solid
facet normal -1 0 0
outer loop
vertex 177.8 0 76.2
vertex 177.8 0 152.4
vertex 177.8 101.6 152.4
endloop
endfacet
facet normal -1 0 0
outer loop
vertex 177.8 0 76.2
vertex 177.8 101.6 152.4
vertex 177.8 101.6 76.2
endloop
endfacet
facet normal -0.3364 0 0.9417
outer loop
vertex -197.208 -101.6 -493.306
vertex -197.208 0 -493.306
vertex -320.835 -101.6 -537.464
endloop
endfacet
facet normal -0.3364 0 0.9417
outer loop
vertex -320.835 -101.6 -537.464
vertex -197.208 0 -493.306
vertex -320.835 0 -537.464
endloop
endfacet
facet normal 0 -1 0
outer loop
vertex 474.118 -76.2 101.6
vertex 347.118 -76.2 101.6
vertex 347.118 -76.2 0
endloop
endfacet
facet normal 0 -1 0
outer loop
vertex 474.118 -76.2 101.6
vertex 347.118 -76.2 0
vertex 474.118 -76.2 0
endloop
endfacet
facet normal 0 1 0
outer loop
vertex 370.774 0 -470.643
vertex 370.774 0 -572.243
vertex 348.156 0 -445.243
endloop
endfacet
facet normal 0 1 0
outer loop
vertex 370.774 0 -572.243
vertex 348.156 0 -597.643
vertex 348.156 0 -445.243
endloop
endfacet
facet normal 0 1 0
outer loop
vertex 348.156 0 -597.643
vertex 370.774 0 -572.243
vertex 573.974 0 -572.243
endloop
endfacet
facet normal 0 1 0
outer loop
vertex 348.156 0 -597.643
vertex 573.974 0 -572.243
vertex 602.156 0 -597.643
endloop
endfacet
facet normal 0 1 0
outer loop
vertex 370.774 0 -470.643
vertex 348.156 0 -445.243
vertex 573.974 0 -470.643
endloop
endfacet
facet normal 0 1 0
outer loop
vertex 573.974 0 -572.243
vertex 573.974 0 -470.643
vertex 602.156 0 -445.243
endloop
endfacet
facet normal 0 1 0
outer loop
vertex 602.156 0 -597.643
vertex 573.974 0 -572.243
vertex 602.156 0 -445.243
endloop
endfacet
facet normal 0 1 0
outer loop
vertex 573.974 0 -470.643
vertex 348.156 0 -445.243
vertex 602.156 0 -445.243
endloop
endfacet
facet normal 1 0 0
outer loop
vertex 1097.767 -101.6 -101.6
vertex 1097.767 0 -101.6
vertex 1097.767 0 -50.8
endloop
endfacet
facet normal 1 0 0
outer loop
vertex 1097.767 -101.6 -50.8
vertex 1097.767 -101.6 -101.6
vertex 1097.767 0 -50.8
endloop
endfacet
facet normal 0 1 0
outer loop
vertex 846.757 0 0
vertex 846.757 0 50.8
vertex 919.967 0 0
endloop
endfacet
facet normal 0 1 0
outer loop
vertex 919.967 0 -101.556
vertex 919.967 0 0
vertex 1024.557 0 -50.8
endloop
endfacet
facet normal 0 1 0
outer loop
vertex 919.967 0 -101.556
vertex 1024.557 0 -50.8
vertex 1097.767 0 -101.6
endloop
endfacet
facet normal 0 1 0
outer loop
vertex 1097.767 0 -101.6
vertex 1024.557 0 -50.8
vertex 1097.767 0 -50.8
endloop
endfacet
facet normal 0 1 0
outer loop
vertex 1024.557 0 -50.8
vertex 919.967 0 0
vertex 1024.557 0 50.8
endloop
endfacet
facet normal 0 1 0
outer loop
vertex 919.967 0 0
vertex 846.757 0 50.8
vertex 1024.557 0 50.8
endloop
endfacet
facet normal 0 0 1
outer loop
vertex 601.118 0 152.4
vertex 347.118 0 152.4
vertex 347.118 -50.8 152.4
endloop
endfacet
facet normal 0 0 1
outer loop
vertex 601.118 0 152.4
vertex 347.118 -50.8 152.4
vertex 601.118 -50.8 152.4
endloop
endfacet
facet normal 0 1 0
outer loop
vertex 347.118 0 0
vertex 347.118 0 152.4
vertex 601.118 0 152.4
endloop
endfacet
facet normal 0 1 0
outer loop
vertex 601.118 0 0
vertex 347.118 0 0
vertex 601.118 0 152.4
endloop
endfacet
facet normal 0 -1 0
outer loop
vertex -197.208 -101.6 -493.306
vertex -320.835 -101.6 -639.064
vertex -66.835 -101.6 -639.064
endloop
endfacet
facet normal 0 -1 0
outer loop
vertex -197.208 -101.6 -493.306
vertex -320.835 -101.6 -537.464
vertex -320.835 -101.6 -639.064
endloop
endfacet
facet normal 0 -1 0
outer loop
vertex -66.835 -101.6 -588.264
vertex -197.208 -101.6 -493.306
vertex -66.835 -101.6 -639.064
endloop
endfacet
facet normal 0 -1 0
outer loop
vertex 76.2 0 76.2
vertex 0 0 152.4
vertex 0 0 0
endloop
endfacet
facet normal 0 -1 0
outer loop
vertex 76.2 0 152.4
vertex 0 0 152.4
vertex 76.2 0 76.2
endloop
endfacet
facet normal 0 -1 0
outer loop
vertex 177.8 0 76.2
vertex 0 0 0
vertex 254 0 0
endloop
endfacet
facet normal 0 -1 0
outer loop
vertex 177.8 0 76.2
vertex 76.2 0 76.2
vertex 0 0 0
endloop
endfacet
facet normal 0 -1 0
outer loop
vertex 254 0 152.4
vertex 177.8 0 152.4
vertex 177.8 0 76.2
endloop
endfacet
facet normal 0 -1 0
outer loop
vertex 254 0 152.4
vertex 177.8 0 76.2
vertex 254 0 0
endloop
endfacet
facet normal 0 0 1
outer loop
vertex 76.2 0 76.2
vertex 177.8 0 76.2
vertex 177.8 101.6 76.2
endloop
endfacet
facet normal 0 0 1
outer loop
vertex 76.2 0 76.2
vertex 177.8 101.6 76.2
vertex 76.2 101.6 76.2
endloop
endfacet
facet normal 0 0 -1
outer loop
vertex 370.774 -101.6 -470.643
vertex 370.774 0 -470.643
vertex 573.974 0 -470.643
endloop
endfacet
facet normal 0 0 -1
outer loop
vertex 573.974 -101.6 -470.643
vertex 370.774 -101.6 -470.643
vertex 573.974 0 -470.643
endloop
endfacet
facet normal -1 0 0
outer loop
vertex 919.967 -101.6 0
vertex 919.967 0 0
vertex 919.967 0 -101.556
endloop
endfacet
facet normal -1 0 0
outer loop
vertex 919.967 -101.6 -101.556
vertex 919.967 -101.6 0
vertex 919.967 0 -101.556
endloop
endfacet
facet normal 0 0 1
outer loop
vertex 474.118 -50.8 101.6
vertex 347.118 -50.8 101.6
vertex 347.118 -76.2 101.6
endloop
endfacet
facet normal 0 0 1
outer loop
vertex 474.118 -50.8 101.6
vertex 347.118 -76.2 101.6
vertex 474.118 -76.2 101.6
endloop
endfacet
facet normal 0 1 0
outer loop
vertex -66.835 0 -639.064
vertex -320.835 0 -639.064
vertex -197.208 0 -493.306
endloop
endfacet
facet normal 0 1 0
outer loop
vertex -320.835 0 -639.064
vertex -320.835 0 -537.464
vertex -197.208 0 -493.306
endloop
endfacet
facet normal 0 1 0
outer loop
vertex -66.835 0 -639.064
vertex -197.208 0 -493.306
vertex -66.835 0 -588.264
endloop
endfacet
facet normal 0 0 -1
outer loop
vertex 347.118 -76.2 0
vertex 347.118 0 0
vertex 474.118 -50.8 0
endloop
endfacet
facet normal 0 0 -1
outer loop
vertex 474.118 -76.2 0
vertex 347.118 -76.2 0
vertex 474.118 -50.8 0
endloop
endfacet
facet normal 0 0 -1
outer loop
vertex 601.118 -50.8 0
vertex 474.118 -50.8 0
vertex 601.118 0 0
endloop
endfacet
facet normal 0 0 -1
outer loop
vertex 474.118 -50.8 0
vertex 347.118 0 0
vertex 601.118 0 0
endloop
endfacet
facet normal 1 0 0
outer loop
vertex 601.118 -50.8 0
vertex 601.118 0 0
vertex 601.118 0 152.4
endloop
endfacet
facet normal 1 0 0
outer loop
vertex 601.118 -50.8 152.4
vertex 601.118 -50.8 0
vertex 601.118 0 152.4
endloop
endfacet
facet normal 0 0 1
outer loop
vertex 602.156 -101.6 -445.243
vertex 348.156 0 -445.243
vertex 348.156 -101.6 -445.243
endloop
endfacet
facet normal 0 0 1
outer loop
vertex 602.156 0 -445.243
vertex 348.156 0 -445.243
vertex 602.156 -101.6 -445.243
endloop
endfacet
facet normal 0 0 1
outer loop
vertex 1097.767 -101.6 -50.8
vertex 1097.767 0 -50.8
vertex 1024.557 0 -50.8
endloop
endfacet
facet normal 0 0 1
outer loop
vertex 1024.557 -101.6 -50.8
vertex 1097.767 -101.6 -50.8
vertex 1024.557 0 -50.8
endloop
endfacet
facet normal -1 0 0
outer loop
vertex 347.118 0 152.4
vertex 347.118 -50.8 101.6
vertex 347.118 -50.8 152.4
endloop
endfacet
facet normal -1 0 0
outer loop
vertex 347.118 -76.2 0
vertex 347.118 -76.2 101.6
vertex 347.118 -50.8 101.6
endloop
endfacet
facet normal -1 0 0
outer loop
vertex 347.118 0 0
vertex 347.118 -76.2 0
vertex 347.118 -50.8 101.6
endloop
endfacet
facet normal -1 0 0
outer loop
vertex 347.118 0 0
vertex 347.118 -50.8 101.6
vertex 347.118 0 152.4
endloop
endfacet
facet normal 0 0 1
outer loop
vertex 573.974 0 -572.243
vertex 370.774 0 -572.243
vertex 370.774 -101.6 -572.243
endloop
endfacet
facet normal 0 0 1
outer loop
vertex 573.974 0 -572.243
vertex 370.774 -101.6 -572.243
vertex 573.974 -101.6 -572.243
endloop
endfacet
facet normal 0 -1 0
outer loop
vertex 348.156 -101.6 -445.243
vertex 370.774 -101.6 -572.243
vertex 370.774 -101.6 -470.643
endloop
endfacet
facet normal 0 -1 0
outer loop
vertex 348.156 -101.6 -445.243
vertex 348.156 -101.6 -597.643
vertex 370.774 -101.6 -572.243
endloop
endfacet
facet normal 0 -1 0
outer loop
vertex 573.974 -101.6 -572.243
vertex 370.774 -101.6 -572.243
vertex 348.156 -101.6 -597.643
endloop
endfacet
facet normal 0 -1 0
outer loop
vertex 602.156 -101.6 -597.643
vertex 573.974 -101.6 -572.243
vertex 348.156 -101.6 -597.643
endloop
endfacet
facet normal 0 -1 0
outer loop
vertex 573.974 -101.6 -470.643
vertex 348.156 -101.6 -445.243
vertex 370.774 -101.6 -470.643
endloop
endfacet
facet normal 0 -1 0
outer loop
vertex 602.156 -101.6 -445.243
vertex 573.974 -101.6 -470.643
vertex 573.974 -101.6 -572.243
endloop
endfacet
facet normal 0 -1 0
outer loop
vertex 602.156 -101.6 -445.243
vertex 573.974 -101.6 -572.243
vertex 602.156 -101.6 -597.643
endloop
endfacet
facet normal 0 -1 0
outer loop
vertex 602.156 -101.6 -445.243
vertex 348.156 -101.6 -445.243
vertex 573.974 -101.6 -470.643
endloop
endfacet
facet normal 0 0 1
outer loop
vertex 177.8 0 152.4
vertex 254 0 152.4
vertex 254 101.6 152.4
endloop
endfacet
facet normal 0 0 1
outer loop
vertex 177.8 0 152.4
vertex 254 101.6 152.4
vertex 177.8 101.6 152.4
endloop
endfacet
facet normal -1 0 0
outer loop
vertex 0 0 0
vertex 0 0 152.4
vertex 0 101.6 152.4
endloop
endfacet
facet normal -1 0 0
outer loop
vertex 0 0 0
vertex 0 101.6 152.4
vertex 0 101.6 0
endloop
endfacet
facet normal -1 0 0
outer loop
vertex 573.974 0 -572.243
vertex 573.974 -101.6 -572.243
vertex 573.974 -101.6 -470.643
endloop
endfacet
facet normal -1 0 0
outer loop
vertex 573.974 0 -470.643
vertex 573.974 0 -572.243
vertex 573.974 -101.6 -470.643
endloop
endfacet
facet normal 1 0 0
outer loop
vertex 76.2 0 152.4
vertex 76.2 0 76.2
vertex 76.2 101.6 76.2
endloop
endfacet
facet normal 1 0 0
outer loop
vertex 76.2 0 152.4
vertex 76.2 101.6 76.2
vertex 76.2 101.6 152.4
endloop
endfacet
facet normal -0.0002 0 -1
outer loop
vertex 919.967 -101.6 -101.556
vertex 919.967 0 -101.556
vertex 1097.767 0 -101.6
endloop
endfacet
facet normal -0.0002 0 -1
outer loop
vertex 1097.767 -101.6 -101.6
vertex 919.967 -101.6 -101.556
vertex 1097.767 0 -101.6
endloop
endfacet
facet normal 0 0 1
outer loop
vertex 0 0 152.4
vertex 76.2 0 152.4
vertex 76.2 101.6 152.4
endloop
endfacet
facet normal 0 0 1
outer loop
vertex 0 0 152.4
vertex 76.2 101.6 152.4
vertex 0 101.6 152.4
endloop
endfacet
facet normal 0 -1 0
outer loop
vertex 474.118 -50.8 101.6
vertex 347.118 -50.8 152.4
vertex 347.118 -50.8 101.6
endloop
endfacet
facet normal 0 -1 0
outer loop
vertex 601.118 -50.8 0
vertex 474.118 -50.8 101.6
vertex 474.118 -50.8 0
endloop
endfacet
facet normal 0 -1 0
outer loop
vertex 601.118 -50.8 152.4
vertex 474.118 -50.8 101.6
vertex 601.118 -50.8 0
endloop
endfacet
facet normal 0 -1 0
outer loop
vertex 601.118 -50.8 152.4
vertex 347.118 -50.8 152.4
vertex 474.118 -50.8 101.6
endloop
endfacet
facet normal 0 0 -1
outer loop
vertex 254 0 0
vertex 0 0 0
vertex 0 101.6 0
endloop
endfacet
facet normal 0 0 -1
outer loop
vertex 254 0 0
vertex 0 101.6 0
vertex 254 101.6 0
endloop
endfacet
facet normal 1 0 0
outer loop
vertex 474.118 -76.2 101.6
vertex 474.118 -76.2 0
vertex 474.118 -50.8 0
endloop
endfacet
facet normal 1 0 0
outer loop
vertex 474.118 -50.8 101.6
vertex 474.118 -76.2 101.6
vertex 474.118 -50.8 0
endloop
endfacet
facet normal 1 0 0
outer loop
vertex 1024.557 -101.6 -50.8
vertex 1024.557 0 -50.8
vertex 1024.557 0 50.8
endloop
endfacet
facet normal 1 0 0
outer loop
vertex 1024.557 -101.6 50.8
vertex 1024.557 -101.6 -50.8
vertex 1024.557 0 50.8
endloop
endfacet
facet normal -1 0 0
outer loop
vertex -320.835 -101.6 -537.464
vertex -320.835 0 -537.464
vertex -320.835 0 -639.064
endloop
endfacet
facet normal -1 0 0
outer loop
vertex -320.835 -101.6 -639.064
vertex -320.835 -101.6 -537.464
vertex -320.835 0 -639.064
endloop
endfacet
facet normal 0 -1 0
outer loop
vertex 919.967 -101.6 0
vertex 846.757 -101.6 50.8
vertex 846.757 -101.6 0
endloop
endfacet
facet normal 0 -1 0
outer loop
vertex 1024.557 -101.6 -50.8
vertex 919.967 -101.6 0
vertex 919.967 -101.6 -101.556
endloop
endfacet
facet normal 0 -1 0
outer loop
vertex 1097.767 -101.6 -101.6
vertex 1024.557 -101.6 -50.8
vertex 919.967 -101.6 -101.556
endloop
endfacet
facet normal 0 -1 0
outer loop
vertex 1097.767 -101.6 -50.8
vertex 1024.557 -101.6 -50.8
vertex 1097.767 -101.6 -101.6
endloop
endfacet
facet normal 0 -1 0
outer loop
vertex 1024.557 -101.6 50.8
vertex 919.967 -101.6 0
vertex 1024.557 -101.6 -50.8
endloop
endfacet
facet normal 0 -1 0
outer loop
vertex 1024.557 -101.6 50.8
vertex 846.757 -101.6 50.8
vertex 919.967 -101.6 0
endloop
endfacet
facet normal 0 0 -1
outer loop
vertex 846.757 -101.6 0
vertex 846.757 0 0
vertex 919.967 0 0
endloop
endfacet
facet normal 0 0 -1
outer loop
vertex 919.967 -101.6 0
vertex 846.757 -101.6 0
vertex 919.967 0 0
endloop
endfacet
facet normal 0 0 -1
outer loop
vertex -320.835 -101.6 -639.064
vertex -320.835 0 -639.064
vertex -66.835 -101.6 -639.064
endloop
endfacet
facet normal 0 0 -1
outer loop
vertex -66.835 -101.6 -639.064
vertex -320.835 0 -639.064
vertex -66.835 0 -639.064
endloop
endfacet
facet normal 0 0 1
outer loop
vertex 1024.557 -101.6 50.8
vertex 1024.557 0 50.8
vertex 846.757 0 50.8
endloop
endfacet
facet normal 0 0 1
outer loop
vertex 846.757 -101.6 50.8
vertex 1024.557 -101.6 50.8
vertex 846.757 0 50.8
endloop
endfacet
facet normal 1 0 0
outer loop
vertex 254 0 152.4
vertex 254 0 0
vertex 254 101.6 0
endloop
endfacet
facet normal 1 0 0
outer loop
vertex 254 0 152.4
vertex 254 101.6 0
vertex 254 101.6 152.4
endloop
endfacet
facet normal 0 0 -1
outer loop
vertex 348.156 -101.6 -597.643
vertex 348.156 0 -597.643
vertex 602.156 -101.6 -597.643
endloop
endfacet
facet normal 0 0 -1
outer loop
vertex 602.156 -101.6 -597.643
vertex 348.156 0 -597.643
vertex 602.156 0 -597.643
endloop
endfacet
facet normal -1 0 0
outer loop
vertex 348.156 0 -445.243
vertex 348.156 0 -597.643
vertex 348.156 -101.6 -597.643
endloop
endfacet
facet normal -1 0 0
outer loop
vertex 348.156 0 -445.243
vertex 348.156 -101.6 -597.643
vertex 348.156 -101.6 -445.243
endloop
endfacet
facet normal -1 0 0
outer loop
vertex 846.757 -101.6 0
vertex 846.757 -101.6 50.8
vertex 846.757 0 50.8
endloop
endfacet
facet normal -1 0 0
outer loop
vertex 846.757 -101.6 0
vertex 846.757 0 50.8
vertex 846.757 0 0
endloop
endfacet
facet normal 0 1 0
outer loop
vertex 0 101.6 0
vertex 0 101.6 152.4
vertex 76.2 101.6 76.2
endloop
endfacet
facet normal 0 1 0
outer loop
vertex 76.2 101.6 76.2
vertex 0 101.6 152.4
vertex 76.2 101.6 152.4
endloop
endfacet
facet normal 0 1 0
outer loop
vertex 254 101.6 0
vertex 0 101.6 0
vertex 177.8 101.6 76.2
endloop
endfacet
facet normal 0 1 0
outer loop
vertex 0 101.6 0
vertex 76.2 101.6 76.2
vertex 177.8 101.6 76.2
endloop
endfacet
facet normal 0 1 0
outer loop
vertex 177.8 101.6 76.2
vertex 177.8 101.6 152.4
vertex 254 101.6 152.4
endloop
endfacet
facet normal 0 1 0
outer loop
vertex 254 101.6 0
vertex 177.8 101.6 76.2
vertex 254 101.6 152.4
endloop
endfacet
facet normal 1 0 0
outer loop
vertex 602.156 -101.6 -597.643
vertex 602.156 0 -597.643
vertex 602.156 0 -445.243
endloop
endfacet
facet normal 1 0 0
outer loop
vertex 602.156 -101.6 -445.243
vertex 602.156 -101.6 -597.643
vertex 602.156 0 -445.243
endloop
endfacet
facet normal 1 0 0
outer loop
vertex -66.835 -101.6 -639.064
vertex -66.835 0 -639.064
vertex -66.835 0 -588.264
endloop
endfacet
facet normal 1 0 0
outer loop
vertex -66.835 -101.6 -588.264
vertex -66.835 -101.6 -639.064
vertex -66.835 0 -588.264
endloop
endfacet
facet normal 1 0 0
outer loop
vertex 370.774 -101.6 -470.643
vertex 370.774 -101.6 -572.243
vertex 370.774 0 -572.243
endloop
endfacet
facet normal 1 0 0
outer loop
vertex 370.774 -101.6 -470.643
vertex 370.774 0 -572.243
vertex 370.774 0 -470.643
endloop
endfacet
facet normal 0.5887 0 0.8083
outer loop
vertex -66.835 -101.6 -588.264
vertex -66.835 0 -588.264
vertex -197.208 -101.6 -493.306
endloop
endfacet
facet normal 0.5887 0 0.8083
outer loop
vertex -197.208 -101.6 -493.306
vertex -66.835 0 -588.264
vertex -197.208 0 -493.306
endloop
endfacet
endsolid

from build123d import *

# Parameters (mm, degrees)
F1_DEPTH  = 101.6
F2_W      = 254
F2_H      = 152.4
F3_DEPTH  = 101.6
F4_W      = 127
F4_H      = 50.8
F5_DEPTH  = 152.4
F6_W      = 127
F6_H      = 101.6
F7_DEPTH  = 25.4
F8_DEPTH  = 50.8
F9_DEPTH  = 25.4
F10_DEPTH = 76.2
F11_W     = 127
F11_H     = 25.4
F12_DEPTH = 50.8
F14_DEPTH = 101.6
F16_DEPTH = 101.6
F17_W     = 254
F17_H     = 152.4
F17_W_2   = 203.2
F17_H_2   = 101.6
F18_DEPTH = 101.6


with BuildPart() as f1:
    # F0 (on Front) → F1 (new body)
    with BuildSketch(Plane.XZ):
        Polygon((254, 0), (254, 152.4), (177.8, 152.4), (177.8, 76.2), (76.2, 76.2), (76.2, 152.4), (0, 152.4), (0, 0), align=None)
    extrude(amount=-F1_DEPTH)


with BuildPart() as f3:
    # F2 (on Front) → F3 (new body)
    with BuildSketch(Plane.XZ):
        with Locations((474.1177520589, 76.2)):
            Rectangle(F2_W, F2_H)
    extrude(amount=F3_DEPTH)

    # F4 (on face) → F5 (cut)
    with BuildSketch(Plane.XY.offset(152.4)):
        with Locations((537.6177520589, -76.2)):
            Rectangle(F4_W, F4_H)
    extrude(amount=-F5_DEPTH, mode=Mode.SUBTRACT)

    # F6 (on face) → F7 (cut)
    with BuildSketch(Plane.XZ.offset(101.6)):
        with Locations((410.6177520589, 101.6)):
            Rectangle(F6_W, F6_H)
    extrude(amount=-F7_DEPTH, mode=Mode.SUBTRACT)

    # F8 (add): a face of the model
    f8_faces = [f3.faces().sort_by_distance(p)[0] for p in [
        (410.6177520589, -88.9, 50.8),
    ]]
    extrude(f8_faces, amount=F8_DEPTH)

    # F9 (cut): a face of the model
    f9_faces = [f3.faces().sort_by_distance(p)[0] for p in [
        (410.6177520589, -88.9, 101.6),
    ]]
    extrude(f9_faces, amount=-F9_DEPTH, mode=Mode.SUBTRACT)

    # F10 (cut): a face of the model
    f10_faces = [f3.faces().sort_by_distance(p)[0] for p in [
        (410.6177520589, -88.9, 76.2),
    ]]
    extrude(f10_faces, amount=-F10_DEPTH, mode=Mode.SUBTRACT)

    # F11 (on face) → F12 (cut)
    with BuildSketch(Plane.XY.offset(152.4)):
        with Locations((410.6177520589, -63.5)):
            Rectangle(F11_W, F11_H)
    extrude(amount=-F12_DEPTH, mode=Mode.SUBTRACT)


with BuildPart() as f14:
    # F13 (on Front) → F14 (new body)
    with BuildSketch(Plane.XZ):
        Polygon((919.9673964482, -101.5560092506), (1097.7673910061, -101.6), (1097.7673910061, -50.8), (1024.556875515, -50.8), (1024.556875515, 50.8), (846.756875515, 50.8), (846.756875515, 0), (919.9673964482, 0), align=None)
    extrude(amount=F14_DEPTH)


with BuildPart() as f16:
    # F15 (on Front) → F16 (new body)
    with BuildSketch(Plane.XZ):
        Polygon((-320.8352584839, -639.0643502142), (-66.8352584839, -639.0643502142), (-66.8352584839, -588.2643502142), (-197.2078233957, -493.3064579964), (-320.8352584839, -537.4643502142), align=None)
    extrude(amount=F16_DEPTH)


with BuildPart() as f18:
    # F17 (on Front) → F18 (new body)
    with BuildSketch(Plane.XZ):
        with Locations((475.1557409763, -521.442592729)):
            Rectangle(F17_W, F17_H)
        with Locations((472.3736432552, -521.442592729)):
            Rectangle(F17_W_2, F17_H_2, mode=Mode.SUBTRACT)
    extrude(amount=F18_DEPTH)


solid = Compound([f1.part, f3.part, f14.part, f16.part, f18.part])
